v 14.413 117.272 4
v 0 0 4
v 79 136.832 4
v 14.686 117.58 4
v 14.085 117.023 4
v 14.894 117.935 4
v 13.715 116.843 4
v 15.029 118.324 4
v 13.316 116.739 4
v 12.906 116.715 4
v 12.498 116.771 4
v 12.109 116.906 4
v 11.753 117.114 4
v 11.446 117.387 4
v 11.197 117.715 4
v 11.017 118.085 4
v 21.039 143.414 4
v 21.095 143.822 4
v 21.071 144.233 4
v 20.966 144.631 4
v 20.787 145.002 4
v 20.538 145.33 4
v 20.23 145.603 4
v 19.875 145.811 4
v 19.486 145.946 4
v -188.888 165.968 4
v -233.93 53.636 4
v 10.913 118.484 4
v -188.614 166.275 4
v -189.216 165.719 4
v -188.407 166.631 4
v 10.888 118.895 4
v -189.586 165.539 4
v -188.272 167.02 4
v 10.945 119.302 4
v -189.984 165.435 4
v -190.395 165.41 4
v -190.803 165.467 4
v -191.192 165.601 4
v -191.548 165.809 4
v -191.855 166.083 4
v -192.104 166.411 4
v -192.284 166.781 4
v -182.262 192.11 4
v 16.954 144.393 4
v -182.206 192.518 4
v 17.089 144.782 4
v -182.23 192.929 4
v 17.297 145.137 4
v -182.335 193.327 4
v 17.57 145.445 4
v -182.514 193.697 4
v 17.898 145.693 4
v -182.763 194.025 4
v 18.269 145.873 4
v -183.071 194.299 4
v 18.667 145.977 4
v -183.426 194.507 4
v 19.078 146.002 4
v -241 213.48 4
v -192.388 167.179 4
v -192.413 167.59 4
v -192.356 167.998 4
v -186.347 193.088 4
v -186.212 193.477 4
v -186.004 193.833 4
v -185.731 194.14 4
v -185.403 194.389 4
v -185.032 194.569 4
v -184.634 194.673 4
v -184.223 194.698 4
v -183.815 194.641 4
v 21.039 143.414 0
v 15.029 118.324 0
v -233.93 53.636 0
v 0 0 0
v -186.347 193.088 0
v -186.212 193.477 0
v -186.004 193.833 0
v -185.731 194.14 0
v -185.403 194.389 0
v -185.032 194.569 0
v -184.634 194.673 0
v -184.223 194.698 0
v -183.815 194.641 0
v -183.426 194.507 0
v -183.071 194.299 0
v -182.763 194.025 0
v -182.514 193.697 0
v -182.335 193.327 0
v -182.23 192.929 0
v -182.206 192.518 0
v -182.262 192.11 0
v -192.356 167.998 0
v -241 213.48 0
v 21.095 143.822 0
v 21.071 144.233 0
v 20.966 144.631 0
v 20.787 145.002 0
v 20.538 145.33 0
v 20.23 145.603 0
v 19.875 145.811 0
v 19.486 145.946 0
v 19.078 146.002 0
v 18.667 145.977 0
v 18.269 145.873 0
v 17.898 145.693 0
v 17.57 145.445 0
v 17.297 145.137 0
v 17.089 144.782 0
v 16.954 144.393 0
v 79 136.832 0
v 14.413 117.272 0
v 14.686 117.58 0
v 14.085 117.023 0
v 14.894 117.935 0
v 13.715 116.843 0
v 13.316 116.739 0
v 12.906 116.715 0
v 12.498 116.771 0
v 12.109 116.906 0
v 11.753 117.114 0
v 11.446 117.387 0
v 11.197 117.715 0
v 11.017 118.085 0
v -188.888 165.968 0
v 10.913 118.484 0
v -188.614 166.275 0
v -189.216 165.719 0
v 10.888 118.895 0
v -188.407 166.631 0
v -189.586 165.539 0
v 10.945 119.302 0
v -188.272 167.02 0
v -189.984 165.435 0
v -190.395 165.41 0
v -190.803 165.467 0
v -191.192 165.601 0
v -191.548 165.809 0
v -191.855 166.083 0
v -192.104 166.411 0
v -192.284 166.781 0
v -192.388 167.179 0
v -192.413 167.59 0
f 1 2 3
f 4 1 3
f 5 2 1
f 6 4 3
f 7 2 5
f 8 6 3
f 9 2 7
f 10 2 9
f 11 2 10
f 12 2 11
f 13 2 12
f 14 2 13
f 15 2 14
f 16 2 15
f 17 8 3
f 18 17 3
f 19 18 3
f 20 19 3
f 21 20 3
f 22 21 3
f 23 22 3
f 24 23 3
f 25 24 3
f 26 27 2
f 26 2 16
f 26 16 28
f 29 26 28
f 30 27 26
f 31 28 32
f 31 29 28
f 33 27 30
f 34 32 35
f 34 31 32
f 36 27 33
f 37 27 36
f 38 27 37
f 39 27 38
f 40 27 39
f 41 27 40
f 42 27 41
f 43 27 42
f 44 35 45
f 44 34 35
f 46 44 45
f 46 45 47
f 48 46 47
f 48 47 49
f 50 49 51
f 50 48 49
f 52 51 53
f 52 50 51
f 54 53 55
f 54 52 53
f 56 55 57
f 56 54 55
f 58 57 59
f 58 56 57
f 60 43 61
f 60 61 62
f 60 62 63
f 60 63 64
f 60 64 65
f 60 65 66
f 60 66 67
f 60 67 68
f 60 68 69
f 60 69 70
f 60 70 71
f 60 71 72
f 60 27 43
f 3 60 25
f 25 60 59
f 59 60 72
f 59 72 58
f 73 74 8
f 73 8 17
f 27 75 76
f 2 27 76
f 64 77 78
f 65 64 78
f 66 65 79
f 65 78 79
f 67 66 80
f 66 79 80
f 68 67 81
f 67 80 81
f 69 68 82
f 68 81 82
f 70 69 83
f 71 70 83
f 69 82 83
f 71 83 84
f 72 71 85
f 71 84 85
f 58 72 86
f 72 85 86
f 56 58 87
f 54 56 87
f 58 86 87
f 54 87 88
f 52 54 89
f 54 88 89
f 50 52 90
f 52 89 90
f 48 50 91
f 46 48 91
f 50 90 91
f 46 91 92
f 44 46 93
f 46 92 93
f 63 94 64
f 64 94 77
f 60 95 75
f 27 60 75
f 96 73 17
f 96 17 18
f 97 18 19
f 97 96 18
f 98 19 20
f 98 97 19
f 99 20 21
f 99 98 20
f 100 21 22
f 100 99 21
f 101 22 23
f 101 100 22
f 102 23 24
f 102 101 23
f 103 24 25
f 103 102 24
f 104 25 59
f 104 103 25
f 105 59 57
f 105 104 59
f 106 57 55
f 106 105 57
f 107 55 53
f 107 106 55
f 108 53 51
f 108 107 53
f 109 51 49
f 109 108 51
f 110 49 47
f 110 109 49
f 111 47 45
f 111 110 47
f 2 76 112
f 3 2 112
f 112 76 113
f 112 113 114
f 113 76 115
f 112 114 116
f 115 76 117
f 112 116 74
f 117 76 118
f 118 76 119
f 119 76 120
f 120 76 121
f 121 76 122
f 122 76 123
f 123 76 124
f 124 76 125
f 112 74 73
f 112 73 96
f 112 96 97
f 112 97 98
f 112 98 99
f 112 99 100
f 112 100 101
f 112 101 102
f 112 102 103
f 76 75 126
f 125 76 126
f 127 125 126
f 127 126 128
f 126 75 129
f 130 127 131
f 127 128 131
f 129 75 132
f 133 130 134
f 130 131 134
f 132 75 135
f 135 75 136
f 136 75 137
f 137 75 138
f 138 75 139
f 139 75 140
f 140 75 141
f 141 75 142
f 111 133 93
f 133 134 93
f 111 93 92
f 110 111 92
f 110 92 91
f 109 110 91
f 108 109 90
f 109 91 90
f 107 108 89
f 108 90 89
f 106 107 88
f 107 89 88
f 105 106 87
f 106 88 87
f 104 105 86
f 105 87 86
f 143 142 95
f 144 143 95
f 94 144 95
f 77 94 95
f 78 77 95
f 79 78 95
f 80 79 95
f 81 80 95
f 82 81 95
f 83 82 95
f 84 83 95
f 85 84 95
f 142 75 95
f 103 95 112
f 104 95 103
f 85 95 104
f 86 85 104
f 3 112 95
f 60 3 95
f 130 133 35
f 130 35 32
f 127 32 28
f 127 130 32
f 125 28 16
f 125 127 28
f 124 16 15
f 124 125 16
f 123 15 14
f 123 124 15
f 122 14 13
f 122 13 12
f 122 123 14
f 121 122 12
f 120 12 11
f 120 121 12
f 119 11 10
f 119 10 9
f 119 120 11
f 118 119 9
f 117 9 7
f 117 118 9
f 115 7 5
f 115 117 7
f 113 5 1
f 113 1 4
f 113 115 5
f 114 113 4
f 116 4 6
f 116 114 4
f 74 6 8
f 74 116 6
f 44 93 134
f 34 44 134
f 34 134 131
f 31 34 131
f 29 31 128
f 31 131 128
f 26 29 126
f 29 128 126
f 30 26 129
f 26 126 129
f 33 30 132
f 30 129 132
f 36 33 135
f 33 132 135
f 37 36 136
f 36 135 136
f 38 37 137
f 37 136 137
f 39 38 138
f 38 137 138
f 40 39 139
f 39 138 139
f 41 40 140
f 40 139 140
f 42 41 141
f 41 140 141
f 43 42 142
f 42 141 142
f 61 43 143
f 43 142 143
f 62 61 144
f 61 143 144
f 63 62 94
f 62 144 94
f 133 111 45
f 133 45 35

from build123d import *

# Parameters (mm, degrees)
BOSS_EXTRUDE1_DEPTH = 4


with BuildPart() as part:
    # Sketch1 → Boss-Extrude1 (new body)
    with BuildSketch(Plane(origin=(0, 0, 0), x_dir=(0, 1, 0), z_dir=(0, 0, 1))):
        Polygon((0, 0), (136.832013798, -79), (213.480030045, 241), (53.636318593, 233.929787175), align=None)
        with BuildLine():
            Line((167.998036635, 192.356313097), (193.088330721, 186.346559132))
            ThreePointArc((193.088330721, 186.346559132), (194.64139794, 183.815159872), (192.10999868, 182.262092653))
            Line((192.10999868, 182.262092653), (167.019704595, 188.271846618))
            ThreePointArc((167.019704595, 188.271846618), (165.466637376, 190.803245878), (167.998036635, 192.356313097))
        make_face(mode=Mode.SUBTRACT)
        with BuildLine():
            Line((118.32403237, -15.029111125), (143.414326455, -21.03886509))
            ThreePointArc((143.414326455, -21.03886509), (145.945725715, -19.485797871), (144.392658496, -16.954398611))
            Line((144.392658496, -16.954398611), (119.30236441, -10.944644646))
            ThreePointArc((119.30236441, -10.944644646), (116.77096515, -12.497711865), (118.32403237, -15.029111125))
        make_face(mode=Mode.SUBTRACT)
    extrude(amount=BOSS_EXTRUDE1_DEPTH)


solid = part.part
